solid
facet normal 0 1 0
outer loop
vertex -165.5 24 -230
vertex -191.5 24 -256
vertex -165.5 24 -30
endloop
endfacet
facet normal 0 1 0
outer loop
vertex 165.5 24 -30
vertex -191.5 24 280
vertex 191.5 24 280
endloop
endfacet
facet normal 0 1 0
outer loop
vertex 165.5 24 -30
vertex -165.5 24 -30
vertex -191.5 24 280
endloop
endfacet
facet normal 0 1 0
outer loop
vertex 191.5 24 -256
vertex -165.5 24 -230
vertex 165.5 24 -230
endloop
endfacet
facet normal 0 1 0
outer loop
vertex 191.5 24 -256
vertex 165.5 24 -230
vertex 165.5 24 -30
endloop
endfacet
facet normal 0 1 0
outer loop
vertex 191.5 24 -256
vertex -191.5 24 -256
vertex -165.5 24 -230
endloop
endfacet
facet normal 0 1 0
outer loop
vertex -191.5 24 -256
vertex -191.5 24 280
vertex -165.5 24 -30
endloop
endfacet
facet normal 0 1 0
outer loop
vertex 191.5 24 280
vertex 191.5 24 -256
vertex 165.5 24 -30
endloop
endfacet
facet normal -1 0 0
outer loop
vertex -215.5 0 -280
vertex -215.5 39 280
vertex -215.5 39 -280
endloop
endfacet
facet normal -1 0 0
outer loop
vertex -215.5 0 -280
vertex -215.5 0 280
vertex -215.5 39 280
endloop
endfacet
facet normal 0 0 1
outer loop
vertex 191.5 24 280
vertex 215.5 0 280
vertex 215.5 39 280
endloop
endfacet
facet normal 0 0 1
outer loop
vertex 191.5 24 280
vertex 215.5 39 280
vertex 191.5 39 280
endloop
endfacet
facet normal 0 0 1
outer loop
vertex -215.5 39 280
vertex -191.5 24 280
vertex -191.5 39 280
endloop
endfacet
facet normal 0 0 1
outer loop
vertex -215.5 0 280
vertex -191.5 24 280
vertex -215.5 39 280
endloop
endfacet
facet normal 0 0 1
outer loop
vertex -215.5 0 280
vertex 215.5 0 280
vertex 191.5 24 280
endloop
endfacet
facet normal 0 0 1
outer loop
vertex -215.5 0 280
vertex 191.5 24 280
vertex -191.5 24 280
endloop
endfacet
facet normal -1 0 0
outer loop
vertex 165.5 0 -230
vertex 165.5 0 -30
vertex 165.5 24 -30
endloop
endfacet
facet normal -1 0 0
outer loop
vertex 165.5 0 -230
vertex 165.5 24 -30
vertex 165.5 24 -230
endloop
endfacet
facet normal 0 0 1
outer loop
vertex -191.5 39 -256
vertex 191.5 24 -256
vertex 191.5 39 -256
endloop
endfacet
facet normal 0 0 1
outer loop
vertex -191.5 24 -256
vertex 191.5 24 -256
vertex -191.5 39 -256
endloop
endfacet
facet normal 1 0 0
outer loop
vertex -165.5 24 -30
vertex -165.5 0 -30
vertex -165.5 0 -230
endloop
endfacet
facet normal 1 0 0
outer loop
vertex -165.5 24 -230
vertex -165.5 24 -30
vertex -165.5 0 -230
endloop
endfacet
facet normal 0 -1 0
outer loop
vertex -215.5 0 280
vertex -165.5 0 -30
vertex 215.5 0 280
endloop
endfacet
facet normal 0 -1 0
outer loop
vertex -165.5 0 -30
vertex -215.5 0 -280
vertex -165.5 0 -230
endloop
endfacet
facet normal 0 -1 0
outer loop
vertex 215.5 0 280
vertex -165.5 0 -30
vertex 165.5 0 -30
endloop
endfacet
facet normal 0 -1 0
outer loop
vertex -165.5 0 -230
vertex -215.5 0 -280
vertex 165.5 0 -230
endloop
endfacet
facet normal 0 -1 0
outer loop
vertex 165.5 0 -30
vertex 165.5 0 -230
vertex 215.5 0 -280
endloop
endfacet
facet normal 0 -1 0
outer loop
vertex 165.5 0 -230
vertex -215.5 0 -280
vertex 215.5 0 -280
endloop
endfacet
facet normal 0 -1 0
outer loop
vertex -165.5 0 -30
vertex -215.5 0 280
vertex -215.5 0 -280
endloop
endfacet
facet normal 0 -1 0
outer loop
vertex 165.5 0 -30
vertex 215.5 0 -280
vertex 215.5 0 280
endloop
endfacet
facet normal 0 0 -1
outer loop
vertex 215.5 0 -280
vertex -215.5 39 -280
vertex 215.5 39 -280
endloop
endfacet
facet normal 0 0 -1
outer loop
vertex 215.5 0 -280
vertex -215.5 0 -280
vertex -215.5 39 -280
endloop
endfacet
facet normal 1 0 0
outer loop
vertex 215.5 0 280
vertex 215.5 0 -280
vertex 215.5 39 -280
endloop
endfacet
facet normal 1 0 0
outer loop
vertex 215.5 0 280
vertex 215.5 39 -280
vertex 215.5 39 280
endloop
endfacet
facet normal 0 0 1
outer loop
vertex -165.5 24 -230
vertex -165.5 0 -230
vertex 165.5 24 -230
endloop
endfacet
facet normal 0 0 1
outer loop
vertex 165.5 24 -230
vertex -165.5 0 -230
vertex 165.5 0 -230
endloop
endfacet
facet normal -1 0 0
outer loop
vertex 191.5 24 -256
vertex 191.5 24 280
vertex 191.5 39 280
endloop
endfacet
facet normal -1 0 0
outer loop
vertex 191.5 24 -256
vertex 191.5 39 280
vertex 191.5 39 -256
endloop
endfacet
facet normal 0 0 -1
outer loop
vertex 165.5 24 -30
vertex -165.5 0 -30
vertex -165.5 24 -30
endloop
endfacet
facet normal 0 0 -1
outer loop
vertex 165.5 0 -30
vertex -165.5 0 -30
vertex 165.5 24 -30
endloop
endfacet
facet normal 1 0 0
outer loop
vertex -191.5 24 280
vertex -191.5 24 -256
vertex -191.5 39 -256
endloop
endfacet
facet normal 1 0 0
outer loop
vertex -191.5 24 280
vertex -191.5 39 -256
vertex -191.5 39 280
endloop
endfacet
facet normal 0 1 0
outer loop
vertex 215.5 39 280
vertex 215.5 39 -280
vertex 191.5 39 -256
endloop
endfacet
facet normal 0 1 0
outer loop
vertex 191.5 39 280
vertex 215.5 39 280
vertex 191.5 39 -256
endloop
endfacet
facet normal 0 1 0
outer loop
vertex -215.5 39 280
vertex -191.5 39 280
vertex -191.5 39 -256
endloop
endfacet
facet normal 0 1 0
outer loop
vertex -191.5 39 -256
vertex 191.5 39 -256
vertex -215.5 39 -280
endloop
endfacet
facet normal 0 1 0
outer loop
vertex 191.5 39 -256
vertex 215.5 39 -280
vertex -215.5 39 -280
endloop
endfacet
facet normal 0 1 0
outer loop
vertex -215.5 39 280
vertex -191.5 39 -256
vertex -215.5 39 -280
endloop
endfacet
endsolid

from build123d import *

# Parameters (mm, degrees)
ESQUISSE1_W        = 431
ESQUISSE1_H        = 560
ESQUISSE1_W_2      = 331
ESQUISSE1_H_2      = 200
BOSS_EXTRU_1_DEPTH = 24
BOSS_EXTRU_2_DEPTH = 15


with BuildPart() as part:
    # Esquisse1 → Boss.-Extru.1 (new body)
    with BuildSketch(Plane(origin=(0, 0, 0), x_dir=(1, 0, 0), z_dir=(0, 1, 0))):
        Rectangle(ESQUISSE1_W, ESQUISSE1_H)
        with Locations((0, 130)):
            Rectangle(ESQUISSE1_W_2, ESQUISSE1_H_2, mode=Mode.SUBTRACT)
    extrude(amount=BOSS_EXTRU_1_DEPTH)

    # Esquisse2 → Boss.-Extru.2 (add)
    with BuildSketch(Plane(origin=(0, 24, 0), x_dir=(1, 0, 0), z_dir=(0, 1, 0))):
        Polygon((-215.5, 280), (215.5, 280), (215.5, -280), (191.5, -280), (191.5, 256), (-191.5, 256), (-191.5, -280), (-215.5, -280), align=None)
    extrude(amount=BOSS_EXTRU_2_DEPTH)


solid = part.part
